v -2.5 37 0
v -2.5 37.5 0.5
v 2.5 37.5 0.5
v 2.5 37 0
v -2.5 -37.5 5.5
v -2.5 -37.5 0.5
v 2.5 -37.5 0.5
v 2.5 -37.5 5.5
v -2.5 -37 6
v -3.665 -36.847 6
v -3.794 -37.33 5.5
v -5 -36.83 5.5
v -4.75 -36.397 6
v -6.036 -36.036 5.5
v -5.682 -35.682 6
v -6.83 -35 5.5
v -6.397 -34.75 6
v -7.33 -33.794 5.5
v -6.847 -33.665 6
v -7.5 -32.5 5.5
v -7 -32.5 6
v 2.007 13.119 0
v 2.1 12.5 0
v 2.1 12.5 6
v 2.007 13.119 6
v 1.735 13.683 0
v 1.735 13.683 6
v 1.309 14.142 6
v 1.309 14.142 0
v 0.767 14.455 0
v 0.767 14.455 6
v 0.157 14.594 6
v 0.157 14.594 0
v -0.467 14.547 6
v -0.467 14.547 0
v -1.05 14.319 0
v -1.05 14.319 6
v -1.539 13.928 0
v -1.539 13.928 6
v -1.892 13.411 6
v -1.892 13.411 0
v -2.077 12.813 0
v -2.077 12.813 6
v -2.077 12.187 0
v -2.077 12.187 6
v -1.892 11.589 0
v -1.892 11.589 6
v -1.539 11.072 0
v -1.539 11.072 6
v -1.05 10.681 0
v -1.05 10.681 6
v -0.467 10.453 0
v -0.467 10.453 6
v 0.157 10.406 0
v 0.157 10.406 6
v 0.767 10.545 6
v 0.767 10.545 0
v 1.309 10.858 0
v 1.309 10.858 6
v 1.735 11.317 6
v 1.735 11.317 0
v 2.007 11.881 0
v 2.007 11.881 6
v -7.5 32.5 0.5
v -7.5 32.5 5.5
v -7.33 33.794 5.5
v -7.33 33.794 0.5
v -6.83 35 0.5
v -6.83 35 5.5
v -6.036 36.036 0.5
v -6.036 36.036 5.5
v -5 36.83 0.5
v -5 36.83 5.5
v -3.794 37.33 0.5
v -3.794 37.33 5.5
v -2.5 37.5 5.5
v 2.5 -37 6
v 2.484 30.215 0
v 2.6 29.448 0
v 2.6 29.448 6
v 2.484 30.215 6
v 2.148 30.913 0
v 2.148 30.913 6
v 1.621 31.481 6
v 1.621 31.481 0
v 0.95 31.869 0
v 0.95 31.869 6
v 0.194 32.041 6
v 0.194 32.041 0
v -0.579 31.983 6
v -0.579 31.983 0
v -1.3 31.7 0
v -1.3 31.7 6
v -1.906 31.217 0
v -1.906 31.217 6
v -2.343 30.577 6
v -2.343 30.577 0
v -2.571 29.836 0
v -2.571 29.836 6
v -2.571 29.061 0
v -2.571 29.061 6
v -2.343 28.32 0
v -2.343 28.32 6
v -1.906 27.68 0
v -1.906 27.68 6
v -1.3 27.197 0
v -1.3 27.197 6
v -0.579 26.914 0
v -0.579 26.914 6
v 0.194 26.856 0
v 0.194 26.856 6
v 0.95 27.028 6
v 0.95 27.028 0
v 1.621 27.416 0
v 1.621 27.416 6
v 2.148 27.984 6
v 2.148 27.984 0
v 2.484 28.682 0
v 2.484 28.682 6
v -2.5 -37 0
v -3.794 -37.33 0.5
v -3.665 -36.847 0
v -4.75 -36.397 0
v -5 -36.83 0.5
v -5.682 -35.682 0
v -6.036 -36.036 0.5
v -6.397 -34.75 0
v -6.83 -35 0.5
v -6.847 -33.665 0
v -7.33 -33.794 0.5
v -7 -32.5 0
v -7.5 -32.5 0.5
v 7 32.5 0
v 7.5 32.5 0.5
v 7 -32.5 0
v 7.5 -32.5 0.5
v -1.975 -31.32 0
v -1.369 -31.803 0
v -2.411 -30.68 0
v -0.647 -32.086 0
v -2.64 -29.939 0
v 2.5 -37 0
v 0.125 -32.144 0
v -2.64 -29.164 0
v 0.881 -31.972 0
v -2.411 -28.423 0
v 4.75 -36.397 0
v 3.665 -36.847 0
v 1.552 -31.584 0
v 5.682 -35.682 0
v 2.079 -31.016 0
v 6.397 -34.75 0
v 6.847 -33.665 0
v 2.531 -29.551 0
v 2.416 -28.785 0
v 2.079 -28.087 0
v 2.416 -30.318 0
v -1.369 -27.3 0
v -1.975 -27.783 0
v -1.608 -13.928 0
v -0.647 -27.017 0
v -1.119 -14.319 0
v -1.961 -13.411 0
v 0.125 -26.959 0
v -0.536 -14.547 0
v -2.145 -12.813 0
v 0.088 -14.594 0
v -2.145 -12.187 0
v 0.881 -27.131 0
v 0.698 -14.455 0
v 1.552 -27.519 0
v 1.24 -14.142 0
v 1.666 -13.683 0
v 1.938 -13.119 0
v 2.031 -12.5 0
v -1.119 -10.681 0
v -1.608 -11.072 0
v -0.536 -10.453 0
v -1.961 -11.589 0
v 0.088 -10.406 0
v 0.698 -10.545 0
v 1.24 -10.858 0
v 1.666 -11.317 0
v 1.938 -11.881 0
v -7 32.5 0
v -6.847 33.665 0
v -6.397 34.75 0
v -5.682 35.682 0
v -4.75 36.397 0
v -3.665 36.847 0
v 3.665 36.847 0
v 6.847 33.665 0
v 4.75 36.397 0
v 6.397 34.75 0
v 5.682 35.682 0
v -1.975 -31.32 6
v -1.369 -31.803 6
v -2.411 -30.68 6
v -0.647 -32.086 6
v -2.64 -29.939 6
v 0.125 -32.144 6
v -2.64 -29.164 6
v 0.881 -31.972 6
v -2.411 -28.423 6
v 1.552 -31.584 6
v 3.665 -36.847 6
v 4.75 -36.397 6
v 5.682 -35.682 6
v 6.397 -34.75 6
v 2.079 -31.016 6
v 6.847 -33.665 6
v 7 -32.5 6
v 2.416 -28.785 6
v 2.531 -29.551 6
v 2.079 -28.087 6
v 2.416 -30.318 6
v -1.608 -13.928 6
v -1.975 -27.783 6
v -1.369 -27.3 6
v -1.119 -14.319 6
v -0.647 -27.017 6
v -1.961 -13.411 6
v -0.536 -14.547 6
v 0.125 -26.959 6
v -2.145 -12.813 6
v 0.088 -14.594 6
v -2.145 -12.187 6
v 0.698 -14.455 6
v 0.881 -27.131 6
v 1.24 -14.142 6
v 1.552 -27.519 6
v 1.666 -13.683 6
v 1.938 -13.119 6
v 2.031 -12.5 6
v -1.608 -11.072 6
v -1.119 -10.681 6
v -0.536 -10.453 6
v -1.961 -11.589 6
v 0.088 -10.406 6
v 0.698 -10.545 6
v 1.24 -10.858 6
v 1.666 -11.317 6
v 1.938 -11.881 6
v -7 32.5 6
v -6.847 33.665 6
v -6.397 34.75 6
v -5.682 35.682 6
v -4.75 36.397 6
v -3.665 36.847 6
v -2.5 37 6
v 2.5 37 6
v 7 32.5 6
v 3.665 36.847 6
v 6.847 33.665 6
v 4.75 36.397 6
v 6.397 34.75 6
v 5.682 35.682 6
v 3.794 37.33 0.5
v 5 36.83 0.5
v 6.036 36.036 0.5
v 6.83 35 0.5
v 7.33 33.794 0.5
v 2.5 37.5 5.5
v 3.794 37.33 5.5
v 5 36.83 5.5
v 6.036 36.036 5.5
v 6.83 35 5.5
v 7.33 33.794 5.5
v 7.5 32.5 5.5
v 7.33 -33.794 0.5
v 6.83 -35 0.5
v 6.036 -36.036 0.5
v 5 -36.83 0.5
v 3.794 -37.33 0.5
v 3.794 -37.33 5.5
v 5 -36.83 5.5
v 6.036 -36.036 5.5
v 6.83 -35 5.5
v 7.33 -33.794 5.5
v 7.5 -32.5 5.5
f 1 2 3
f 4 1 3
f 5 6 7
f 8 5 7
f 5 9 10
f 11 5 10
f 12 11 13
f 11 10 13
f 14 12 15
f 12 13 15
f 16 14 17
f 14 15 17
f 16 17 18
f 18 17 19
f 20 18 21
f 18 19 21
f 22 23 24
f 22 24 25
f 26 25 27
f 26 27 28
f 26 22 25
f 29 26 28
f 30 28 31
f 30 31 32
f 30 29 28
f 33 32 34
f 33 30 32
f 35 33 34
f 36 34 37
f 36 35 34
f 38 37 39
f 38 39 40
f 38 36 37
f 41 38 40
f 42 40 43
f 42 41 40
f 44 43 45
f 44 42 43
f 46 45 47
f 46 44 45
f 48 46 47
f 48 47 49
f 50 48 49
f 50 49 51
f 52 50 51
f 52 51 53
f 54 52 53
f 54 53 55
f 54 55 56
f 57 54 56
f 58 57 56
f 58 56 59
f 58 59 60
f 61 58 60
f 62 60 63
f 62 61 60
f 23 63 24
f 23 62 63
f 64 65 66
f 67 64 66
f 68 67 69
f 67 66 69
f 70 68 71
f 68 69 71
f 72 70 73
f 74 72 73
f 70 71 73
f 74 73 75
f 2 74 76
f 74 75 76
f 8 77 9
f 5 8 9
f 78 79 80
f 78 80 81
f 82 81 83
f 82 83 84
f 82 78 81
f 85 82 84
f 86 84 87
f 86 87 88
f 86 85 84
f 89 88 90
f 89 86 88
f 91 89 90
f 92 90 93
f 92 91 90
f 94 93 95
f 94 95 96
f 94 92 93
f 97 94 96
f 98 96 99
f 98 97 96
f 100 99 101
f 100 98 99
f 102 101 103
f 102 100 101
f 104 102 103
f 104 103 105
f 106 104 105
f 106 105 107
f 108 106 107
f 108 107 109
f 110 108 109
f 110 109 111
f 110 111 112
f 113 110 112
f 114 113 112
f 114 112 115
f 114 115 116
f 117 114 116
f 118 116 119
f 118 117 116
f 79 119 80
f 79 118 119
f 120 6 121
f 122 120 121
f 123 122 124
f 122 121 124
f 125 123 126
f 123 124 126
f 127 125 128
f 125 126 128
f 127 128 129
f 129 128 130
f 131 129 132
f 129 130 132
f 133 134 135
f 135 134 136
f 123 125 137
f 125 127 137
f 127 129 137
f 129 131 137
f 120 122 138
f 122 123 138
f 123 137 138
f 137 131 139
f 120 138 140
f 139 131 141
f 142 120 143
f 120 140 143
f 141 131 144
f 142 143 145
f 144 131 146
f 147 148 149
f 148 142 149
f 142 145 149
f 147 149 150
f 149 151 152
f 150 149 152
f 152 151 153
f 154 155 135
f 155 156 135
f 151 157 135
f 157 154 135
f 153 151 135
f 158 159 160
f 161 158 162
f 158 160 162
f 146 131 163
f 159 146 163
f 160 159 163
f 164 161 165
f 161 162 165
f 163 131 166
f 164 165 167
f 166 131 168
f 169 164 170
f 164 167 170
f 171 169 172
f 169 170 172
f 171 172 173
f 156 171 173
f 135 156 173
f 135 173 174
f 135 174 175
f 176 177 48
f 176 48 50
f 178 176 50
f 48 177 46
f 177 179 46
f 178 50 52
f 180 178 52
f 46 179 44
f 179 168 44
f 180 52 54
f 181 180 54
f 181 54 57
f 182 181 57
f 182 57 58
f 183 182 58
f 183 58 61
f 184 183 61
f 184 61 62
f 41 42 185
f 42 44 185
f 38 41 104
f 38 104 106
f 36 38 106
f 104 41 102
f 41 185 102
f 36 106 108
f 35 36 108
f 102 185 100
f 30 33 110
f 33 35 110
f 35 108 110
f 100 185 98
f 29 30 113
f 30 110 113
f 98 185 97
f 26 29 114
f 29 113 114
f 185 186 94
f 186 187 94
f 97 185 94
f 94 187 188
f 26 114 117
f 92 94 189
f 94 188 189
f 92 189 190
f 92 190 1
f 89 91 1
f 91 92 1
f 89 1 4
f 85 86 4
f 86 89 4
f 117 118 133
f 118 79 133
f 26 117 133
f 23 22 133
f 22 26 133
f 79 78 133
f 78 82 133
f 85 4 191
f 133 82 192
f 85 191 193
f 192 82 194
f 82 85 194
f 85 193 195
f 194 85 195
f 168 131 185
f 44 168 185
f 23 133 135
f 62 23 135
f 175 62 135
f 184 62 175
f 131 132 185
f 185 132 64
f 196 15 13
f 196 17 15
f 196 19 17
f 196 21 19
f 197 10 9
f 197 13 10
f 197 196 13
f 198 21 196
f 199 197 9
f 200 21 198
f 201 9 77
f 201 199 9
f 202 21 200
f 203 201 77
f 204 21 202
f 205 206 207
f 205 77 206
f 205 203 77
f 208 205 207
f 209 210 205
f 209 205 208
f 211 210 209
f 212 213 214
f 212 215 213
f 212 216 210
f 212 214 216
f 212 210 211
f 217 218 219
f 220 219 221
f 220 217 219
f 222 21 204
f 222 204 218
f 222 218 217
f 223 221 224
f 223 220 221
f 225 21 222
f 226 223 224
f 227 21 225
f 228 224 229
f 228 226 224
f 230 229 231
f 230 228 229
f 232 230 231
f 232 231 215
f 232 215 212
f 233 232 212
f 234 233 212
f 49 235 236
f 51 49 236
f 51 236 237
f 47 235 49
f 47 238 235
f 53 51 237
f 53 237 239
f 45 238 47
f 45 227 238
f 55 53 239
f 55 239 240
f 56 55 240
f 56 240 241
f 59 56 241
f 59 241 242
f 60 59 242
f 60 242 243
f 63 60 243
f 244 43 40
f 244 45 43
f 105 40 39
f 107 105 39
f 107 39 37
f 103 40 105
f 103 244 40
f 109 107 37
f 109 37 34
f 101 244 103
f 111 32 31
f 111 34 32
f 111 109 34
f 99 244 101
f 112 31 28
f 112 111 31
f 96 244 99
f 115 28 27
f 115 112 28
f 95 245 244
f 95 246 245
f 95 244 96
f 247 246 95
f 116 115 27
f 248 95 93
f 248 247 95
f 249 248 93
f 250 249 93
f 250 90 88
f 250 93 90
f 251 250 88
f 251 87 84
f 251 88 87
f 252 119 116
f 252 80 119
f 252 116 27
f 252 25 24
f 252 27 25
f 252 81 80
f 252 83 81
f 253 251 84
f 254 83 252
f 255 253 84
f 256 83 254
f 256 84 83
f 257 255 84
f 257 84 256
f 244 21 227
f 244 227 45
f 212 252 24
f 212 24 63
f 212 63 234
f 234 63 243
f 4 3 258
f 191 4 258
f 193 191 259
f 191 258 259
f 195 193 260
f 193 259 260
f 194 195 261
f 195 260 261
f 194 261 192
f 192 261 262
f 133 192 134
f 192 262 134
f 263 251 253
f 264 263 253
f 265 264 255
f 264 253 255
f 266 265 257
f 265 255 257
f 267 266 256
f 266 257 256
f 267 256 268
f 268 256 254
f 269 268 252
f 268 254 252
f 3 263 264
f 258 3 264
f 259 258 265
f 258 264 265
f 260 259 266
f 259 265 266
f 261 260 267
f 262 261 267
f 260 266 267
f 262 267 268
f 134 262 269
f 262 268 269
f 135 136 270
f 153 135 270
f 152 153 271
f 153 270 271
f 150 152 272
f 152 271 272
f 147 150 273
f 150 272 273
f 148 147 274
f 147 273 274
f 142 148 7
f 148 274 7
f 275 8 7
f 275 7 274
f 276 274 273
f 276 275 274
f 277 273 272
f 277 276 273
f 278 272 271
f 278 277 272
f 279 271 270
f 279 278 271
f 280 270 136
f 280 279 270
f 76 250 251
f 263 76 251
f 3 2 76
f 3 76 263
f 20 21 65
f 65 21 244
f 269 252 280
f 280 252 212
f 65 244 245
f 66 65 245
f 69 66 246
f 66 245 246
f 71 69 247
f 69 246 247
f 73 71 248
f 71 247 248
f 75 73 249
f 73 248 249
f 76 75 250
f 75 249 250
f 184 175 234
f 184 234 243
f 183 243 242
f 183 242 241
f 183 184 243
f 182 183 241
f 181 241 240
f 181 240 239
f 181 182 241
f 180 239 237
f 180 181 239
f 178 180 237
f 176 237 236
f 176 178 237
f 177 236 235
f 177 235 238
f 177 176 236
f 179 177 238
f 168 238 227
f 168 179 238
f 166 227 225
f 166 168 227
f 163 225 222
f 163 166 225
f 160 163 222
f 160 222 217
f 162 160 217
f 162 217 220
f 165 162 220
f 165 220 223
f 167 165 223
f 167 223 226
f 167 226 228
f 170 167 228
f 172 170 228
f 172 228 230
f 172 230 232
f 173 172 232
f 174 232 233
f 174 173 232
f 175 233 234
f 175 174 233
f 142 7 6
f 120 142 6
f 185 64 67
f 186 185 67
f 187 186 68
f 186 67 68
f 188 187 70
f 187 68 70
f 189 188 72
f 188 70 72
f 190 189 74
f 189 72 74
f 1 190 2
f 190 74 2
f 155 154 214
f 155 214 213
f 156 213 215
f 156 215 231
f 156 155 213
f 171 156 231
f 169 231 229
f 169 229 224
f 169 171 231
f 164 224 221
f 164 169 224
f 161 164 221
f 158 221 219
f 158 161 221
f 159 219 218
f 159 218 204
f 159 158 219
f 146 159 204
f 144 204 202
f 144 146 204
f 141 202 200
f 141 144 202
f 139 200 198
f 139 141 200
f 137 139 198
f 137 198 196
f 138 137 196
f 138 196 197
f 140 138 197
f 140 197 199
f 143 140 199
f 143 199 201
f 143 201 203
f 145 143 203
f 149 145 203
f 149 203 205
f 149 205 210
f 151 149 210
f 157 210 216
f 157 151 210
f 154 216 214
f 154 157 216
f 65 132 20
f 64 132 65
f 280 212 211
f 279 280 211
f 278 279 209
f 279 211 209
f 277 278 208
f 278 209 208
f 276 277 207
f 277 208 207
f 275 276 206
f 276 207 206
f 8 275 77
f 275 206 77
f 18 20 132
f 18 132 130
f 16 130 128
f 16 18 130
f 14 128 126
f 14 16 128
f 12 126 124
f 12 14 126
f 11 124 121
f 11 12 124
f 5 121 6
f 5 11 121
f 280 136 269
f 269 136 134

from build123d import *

# Parameters (mm, degrees)
F0_W     = 15
F0_H     = 75
F0_R     = 2.6
F0_R_2   = 2.1
F1_DEPTH = 6
F2_R     = 5
F3_SIZE  = 0.5


with BuildPart() as f1:
    # F0 (on Top) → F1 (new body)
    with BuildSketch(Plane.XY):
        Rectangle(F0_W, F0_H)
        with Locations((-0.0689222117, -29.5514707496)):
            Circle(F0_R, mode=Mode.SUBTRACT)
        with Locations((-0.0689222117, -12.5)):
            Circle(F0_R_2, mode=Mode.SUBTRACT)
        with Locations((0, 12.5)):
            Circle(F0_R_2, mode=Mode.SUBTRACT)
        with Locations((0, 29.4484889938)):
            Circle(F0_R, mode=Mode.SUBTRACT)
    extrude(amount=F1_DEPTH)

    # F2
    f2_edges = [f1.edges().sort_by_distance(p)[0] for p in [
        (-7.5, 37.5, 3),
        (7.5, 37.5, 3),
        (-7.5, -37.5, 3),
        (7.5, -37.5, 3),
    ]]
    fillet(f2_edges, radius=F2_R)

    # F3
    f3_edges = [f1.edges().sort_by_distance(p)[0] for p in [
        (-7.5, 0, 6),
        (7.5, 0, 6),
        (6.035534, 36.035534, 6),
        (0, 37.5, 6),
        (-6.035534, 36.035534, 6),
        (-6.035534, -36.035534, 6),
        (0, -37.5, 6),
        (6.035534, -36.035534, 6),
        (-6.035534, 36.035534, 0),
        (0, 37.5, 0),
        (6.035534, 36.035534, 0),
        (7.5, 0, 0),
        (-7.5, 0, 0),
        (-6.035534, -36.035534, 0),
        (0, -37.5, 0),
        (6.035534, -36.035534, 0),
    ]]
    chamfer(f3_edges, length=F3_SIZE)


solid = f1.part
